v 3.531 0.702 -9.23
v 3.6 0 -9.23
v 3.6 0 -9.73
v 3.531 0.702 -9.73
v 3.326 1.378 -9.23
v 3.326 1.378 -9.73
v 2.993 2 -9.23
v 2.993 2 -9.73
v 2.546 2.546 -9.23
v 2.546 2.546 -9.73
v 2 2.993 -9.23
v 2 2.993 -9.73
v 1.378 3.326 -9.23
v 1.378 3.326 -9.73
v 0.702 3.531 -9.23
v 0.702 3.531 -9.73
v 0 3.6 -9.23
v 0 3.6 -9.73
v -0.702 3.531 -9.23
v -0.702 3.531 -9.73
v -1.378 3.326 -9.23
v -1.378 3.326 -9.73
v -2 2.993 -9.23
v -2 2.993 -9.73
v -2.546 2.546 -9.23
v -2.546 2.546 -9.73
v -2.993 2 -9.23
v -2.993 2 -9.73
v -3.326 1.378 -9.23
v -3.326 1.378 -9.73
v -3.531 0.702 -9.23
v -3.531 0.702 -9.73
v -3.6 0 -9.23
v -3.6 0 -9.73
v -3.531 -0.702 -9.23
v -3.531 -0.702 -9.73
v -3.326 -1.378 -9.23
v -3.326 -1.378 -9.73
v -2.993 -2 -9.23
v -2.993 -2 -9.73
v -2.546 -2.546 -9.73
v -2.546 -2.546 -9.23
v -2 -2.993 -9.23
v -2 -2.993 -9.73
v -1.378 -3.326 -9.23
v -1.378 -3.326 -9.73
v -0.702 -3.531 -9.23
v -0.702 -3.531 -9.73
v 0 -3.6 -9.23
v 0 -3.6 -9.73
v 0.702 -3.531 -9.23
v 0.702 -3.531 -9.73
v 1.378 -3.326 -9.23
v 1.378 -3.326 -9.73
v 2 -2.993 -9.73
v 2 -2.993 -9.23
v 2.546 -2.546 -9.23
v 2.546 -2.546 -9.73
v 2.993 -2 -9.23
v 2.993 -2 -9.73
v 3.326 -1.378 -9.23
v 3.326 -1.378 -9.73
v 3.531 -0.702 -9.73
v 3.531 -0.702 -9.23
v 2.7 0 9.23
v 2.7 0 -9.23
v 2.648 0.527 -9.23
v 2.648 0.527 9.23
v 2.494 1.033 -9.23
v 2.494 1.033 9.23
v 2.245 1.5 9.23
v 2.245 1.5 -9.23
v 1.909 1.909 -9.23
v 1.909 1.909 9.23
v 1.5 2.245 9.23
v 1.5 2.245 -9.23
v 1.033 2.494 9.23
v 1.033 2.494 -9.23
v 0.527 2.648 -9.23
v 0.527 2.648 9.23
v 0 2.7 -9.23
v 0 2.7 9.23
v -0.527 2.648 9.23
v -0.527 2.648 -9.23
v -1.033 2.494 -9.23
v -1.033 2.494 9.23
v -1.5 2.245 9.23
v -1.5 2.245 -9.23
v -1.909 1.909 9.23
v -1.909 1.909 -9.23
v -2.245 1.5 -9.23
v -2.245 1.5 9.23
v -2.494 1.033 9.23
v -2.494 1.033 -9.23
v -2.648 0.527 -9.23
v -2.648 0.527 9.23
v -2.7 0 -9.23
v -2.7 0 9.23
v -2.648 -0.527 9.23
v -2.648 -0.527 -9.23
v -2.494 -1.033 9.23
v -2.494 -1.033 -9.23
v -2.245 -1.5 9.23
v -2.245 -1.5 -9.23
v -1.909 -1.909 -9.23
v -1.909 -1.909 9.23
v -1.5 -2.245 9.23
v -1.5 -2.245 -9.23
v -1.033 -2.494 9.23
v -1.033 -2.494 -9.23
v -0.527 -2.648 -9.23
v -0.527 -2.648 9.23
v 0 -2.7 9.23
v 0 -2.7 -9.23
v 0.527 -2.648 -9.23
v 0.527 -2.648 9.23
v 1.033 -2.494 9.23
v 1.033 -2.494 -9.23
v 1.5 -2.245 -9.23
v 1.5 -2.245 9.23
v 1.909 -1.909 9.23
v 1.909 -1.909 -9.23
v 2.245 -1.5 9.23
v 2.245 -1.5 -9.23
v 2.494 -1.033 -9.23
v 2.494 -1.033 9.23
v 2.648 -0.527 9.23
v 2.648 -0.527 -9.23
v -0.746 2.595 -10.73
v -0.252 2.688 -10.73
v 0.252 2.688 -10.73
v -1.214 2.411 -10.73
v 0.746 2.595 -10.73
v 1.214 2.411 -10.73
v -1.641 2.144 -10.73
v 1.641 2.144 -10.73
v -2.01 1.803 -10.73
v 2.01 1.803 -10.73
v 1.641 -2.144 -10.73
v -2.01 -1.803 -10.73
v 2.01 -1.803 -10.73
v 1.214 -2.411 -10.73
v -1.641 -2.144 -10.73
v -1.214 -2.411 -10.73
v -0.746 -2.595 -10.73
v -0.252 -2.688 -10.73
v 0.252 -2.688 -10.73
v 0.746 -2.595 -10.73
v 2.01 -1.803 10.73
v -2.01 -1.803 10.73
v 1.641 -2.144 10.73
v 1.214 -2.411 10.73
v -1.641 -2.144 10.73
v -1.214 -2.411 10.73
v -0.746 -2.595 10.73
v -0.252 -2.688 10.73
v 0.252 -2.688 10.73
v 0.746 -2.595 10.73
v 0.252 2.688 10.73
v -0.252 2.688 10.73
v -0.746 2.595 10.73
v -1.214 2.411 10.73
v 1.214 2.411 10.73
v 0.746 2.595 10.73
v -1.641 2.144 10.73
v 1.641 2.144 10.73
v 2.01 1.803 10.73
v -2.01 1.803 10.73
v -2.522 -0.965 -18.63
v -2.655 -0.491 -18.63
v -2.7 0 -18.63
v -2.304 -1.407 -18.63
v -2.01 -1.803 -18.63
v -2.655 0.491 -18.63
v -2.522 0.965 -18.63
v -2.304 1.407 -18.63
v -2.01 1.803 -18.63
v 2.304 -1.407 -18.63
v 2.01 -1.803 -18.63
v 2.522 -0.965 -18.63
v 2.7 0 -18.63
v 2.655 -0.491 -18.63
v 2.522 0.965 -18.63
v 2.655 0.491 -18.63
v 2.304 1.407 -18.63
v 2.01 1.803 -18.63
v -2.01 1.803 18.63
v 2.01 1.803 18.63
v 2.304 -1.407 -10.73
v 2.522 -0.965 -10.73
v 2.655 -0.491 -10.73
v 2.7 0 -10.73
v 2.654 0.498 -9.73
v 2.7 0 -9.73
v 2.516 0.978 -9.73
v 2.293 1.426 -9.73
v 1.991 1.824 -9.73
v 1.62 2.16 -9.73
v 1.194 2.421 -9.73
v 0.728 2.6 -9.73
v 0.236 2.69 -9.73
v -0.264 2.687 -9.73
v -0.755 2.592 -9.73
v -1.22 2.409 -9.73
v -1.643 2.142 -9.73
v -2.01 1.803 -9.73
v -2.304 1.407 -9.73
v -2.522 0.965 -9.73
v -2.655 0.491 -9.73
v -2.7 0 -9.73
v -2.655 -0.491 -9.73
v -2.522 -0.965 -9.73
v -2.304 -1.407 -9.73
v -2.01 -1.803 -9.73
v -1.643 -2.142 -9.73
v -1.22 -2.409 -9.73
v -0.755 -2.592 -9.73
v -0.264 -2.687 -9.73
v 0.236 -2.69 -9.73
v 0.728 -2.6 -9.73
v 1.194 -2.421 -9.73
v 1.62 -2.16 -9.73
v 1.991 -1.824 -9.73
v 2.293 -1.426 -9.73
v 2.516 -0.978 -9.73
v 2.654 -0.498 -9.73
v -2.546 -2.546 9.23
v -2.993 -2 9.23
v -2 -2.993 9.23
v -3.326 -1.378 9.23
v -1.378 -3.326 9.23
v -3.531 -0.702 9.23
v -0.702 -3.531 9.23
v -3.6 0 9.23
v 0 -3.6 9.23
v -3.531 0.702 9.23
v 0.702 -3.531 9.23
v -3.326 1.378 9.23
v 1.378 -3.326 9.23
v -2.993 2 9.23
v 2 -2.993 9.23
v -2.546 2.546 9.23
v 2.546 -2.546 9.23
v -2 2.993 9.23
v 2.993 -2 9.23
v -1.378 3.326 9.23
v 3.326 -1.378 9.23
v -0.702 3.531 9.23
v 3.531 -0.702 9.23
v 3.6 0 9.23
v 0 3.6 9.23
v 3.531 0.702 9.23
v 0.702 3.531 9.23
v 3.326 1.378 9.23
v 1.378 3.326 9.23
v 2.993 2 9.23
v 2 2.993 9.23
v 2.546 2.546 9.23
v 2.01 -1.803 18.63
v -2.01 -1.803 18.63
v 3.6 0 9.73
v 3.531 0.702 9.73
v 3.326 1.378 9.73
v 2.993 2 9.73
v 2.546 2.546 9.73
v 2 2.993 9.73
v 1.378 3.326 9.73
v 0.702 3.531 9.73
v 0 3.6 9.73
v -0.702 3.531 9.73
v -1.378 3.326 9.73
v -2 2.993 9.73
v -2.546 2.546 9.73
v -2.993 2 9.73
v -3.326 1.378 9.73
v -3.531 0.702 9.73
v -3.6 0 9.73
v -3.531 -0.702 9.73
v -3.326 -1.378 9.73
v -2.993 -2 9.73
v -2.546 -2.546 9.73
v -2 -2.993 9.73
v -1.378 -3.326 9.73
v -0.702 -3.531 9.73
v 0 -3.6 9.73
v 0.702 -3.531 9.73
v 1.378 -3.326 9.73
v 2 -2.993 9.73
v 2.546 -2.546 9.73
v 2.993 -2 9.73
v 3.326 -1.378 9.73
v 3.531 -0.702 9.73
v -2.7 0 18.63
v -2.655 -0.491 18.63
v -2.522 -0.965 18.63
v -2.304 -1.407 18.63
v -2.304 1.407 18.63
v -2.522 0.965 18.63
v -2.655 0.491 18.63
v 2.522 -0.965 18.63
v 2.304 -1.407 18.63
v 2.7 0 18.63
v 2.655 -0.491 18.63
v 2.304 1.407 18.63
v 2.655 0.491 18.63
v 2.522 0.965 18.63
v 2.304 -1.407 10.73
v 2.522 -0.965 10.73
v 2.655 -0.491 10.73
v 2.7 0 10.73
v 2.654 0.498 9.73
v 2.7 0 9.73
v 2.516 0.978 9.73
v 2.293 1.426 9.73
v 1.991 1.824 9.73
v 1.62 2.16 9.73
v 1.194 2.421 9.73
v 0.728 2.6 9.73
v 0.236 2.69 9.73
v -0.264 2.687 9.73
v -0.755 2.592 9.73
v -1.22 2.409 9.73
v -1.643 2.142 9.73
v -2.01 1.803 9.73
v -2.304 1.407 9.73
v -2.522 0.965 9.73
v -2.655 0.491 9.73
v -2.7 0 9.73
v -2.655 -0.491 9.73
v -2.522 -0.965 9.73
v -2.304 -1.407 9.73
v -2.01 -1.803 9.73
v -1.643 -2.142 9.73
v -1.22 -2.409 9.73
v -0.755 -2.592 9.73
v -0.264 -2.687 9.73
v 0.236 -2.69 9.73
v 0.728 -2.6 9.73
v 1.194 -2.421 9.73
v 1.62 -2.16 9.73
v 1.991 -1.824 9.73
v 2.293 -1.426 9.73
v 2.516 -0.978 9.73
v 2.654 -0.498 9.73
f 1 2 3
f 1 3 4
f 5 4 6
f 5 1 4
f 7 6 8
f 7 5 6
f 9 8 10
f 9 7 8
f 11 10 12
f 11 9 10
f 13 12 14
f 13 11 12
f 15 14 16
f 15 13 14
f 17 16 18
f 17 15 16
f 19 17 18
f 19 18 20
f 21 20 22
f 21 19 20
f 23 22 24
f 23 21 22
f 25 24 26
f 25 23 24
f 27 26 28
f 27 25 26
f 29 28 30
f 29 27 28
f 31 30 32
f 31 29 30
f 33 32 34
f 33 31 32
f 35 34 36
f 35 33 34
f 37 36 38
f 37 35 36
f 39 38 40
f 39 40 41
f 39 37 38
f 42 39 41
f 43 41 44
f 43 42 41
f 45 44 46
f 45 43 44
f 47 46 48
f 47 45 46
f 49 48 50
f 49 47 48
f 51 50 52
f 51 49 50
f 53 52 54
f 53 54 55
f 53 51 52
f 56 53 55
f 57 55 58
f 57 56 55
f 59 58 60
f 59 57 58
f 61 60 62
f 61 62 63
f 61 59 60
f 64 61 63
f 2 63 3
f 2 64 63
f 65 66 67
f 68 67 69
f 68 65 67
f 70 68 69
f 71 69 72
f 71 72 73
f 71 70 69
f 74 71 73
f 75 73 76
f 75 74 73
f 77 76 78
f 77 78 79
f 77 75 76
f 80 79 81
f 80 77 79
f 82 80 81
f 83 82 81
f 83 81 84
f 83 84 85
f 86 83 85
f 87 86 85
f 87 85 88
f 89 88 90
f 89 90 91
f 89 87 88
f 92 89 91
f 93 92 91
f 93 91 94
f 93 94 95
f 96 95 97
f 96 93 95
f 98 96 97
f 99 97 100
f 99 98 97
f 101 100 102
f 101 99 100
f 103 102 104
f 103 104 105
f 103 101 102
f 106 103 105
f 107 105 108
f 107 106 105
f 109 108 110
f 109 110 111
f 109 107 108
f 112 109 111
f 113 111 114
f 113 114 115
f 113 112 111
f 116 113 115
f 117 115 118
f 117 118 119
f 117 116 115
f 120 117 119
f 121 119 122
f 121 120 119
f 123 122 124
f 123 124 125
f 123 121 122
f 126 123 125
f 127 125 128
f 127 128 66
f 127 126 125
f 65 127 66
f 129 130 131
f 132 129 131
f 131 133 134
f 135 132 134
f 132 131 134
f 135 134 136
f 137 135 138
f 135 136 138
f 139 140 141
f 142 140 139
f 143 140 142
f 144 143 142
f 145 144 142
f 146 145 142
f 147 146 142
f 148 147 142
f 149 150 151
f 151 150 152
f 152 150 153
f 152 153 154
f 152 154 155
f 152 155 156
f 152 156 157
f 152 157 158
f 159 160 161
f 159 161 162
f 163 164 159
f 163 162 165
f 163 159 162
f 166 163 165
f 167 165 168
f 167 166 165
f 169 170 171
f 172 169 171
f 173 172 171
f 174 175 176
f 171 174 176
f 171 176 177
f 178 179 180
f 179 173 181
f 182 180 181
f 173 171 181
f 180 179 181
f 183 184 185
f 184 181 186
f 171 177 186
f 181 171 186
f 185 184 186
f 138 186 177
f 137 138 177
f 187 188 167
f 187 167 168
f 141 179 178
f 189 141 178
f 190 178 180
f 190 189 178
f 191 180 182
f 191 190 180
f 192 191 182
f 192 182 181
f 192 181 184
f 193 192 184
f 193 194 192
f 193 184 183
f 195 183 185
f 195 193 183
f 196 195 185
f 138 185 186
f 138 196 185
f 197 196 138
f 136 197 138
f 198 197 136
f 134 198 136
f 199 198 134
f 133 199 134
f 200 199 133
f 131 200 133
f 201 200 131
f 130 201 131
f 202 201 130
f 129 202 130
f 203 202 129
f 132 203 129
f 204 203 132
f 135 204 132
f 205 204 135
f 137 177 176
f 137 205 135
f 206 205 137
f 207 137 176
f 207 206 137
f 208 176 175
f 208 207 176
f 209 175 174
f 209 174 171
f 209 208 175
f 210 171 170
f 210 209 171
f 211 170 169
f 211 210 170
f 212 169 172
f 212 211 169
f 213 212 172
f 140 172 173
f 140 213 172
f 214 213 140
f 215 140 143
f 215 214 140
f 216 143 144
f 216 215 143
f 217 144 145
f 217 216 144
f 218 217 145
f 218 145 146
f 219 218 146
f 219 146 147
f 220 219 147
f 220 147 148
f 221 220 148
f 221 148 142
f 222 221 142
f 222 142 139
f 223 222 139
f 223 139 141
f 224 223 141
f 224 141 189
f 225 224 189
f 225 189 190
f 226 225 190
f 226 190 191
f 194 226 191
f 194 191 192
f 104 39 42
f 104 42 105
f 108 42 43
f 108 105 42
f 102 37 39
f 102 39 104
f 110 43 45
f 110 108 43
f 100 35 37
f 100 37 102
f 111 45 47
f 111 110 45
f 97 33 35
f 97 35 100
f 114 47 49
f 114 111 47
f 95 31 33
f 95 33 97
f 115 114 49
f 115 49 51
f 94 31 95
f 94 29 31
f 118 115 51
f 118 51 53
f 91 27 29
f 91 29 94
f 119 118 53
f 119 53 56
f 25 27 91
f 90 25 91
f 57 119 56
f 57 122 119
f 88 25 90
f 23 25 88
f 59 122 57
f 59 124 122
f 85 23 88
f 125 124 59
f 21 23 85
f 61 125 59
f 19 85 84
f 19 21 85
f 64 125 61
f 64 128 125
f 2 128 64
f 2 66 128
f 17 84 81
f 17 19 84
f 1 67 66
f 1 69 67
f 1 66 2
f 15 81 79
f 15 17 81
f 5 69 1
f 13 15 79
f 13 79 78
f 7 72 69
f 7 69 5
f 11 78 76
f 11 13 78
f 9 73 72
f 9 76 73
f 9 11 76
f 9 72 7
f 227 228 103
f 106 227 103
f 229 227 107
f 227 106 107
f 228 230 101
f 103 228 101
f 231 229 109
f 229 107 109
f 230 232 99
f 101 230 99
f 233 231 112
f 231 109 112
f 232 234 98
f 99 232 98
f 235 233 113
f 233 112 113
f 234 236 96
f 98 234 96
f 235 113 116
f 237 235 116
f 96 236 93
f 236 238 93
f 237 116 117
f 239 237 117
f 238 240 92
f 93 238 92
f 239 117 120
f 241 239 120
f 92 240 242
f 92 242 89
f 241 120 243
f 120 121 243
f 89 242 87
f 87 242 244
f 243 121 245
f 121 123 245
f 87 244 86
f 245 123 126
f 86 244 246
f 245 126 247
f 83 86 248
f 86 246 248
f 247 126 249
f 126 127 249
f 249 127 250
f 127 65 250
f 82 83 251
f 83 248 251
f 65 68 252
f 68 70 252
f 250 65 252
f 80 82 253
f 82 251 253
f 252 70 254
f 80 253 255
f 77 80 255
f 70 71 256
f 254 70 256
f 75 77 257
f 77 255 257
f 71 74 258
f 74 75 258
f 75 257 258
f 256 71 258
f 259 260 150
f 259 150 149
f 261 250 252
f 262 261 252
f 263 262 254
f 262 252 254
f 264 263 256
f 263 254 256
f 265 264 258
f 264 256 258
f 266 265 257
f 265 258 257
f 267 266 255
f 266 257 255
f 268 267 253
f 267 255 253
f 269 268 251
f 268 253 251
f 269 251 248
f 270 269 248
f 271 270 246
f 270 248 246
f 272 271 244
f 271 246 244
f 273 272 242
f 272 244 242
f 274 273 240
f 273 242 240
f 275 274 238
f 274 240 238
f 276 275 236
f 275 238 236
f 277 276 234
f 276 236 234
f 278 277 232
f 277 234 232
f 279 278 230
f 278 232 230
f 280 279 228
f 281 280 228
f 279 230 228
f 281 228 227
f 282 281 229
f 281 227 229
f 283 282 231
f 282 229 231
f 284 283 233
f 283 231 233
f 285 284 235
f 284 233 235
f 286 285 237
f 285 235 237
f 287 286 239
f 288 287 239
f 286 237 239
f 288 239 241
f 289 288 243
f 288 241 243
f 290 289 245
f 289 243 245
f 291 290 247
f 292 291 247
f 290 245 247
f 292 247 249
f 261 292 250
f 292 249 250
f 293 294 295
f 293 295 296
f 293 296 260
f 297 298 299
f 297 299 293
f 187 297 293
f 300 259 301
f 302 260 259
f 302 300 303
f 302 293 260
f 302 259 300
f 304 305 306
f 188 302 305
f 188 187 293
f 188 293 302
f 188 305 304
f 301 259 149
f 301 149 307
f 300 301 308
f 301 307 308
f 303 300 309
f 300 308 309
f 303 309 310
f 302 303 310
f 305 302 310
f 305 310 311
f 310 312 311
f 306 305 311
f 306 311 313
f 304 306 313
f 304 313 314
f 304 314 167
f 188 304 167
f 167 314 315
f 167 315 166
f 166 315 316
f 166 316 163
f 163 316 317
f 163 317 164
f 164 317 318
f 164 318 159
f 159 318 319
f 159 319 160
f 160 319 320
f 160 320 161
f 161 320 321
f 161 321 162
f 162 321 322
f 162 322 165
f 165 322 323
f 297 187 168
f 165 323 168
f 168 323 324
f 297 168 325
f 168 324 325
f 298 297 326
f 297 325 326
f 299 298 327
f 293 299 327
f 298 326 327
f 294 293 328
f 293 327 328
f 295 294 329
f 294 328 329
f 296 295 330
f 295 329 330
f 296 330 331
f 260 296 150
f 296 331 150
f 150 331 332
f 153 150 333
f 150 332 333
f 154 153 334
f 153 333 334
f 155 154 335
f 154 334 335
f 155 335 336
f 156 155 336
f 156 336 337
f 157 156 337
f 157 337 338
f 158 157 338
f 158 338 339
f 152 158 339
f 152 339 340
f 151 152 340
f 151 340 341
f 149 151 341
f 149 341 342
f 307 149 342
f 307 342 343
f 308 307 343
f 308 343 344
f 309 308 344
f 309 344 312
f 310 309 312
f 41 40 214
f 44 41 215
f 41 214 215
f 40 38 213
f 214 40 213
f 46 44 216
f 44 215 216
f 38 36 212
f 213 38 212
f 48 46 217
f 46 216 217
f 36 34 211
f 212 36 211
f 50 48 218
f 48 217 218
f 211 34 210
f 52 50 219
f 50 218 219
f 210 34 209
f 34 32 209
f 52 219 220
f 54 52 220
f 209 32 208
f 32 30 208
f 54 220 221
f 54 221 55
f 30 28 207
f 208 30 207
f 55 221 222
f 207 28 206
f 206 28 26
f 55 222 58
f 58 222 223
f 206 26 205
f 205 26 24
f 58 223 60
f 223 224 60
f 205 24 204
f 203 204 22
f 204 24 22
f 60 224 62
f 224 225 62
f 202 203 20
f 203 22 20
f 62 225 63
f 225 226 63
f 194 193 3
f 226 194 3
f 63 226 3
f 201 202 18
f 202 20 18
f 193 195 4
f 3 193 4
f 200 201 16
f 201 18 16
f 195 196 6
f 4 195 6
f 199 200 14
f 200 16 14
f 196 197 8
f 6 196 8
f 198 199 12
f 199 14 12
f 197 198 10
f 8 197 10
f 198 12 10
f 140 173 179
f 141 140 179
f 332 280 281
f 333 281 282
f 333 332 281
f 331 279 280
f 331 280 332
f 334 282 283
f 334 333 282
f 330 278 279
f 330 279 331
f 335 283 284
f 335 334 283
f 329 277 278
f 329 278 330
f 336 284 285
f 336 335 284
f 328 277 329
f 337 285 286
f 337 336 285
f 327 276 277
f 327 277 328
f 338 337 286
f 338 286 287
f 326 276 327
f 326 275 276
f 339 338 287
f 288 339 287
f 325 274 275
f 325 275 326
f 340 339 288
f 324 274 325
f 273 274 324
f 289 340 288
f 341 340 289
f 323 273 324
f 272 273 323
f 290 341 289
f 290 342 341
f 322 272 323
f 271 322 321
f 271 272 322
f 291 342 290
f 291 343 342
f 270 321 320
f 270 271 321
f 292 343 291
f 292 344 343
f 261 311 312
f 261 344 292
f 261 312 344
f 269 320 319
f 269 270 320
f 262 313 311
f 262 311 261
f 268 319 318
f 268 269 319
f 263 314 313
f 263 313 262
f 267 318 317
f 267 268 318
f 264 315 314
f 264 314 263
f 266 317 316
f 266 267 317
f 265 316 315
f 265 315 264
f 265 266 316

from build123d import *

# Parameters (mm, degrees)
SKETCH1_R           = 2.7
BOSS_EXTRUDE1_DEPTH = 9.23
SKETCH2_R           = 3.6
BOSS_EXTRUDE2_DEPTH = 0.5
SKETCH3_R           = 2.7
BOSS_EXTRUDE3_DEPTH = 1
BOSS_EXTRUDE4_DEPTH = 8.9


with BuildPart() as part:
    # Sketch1 → Boss-Extrude1 (new, symmetric)
    with BuildSketch(Plane.XY):
        Circle(SKETCH1_R)
    extrude(amount=BOSS_EXTRUDE1_DEPTH, both=True)

    # Sketch2 → Boss-Extrude2 (add)
    with BuildSketch(Plane.XY.offset(9.23)):
        Circle(SKETCH2_R)
    boss_extrude2 = extrude(amount=BOSS_EXTRUDE2_DEPTH)

    # Sketch3 → Boss-Extrude3 (add)
    with BuildSketch(Plane.XY.offset(9.73)):
        Circle(SKETCH3_R)
    boss_extrude3 = extrude(amount=BOSS_EXTRUDE3_DEPTH)

    # Sketch3_3 → Boss-Extrude4 (add)
    with BuildSketch(Plane.XY.offset(9.73)):
        with BuildLine():
            ThreePointArc((-2.01, 1.802747903), (-2.521606631, 0.965142477), (-2.7, 0))
            Line((-2.7, 0), (2.7, 0))
            ThreePointArc((2.7, 0), (2.521606631, 0.965142477), (2.01, 1.802747903))
            Line((2.01, 1.802747903), (-2.01, 1.802747903))
        make_face()
        with BuildLine():
            Line((2.7, 0), (-2.7, 0))
            ThreePointArc((-2.7, 0), (-2.521606631, -0.965142477), (-2.01, -1.802747903))
            Line((-2.01, -1.802747903), (2.01, -1.802747903))
            ThreePointArc((2.01, -1.802747903), (2.521606631, -0.965142477), (2.7, 0))
        make_face()
    boss_extrude4 = extrude(amount=BOSS_EXTRUDE4_DEPTH)

    # Mirror1: Boss-Extrude2, Boss-Extrude3, Boss-Extrude4 across plane
    add(boss_extrude2.mirror(Plane.XY))
    add(boss_extrude3.mirror(Plane.XY))
    add(boss_extrude4.mirror(Plane.XY))


solid = part.part
